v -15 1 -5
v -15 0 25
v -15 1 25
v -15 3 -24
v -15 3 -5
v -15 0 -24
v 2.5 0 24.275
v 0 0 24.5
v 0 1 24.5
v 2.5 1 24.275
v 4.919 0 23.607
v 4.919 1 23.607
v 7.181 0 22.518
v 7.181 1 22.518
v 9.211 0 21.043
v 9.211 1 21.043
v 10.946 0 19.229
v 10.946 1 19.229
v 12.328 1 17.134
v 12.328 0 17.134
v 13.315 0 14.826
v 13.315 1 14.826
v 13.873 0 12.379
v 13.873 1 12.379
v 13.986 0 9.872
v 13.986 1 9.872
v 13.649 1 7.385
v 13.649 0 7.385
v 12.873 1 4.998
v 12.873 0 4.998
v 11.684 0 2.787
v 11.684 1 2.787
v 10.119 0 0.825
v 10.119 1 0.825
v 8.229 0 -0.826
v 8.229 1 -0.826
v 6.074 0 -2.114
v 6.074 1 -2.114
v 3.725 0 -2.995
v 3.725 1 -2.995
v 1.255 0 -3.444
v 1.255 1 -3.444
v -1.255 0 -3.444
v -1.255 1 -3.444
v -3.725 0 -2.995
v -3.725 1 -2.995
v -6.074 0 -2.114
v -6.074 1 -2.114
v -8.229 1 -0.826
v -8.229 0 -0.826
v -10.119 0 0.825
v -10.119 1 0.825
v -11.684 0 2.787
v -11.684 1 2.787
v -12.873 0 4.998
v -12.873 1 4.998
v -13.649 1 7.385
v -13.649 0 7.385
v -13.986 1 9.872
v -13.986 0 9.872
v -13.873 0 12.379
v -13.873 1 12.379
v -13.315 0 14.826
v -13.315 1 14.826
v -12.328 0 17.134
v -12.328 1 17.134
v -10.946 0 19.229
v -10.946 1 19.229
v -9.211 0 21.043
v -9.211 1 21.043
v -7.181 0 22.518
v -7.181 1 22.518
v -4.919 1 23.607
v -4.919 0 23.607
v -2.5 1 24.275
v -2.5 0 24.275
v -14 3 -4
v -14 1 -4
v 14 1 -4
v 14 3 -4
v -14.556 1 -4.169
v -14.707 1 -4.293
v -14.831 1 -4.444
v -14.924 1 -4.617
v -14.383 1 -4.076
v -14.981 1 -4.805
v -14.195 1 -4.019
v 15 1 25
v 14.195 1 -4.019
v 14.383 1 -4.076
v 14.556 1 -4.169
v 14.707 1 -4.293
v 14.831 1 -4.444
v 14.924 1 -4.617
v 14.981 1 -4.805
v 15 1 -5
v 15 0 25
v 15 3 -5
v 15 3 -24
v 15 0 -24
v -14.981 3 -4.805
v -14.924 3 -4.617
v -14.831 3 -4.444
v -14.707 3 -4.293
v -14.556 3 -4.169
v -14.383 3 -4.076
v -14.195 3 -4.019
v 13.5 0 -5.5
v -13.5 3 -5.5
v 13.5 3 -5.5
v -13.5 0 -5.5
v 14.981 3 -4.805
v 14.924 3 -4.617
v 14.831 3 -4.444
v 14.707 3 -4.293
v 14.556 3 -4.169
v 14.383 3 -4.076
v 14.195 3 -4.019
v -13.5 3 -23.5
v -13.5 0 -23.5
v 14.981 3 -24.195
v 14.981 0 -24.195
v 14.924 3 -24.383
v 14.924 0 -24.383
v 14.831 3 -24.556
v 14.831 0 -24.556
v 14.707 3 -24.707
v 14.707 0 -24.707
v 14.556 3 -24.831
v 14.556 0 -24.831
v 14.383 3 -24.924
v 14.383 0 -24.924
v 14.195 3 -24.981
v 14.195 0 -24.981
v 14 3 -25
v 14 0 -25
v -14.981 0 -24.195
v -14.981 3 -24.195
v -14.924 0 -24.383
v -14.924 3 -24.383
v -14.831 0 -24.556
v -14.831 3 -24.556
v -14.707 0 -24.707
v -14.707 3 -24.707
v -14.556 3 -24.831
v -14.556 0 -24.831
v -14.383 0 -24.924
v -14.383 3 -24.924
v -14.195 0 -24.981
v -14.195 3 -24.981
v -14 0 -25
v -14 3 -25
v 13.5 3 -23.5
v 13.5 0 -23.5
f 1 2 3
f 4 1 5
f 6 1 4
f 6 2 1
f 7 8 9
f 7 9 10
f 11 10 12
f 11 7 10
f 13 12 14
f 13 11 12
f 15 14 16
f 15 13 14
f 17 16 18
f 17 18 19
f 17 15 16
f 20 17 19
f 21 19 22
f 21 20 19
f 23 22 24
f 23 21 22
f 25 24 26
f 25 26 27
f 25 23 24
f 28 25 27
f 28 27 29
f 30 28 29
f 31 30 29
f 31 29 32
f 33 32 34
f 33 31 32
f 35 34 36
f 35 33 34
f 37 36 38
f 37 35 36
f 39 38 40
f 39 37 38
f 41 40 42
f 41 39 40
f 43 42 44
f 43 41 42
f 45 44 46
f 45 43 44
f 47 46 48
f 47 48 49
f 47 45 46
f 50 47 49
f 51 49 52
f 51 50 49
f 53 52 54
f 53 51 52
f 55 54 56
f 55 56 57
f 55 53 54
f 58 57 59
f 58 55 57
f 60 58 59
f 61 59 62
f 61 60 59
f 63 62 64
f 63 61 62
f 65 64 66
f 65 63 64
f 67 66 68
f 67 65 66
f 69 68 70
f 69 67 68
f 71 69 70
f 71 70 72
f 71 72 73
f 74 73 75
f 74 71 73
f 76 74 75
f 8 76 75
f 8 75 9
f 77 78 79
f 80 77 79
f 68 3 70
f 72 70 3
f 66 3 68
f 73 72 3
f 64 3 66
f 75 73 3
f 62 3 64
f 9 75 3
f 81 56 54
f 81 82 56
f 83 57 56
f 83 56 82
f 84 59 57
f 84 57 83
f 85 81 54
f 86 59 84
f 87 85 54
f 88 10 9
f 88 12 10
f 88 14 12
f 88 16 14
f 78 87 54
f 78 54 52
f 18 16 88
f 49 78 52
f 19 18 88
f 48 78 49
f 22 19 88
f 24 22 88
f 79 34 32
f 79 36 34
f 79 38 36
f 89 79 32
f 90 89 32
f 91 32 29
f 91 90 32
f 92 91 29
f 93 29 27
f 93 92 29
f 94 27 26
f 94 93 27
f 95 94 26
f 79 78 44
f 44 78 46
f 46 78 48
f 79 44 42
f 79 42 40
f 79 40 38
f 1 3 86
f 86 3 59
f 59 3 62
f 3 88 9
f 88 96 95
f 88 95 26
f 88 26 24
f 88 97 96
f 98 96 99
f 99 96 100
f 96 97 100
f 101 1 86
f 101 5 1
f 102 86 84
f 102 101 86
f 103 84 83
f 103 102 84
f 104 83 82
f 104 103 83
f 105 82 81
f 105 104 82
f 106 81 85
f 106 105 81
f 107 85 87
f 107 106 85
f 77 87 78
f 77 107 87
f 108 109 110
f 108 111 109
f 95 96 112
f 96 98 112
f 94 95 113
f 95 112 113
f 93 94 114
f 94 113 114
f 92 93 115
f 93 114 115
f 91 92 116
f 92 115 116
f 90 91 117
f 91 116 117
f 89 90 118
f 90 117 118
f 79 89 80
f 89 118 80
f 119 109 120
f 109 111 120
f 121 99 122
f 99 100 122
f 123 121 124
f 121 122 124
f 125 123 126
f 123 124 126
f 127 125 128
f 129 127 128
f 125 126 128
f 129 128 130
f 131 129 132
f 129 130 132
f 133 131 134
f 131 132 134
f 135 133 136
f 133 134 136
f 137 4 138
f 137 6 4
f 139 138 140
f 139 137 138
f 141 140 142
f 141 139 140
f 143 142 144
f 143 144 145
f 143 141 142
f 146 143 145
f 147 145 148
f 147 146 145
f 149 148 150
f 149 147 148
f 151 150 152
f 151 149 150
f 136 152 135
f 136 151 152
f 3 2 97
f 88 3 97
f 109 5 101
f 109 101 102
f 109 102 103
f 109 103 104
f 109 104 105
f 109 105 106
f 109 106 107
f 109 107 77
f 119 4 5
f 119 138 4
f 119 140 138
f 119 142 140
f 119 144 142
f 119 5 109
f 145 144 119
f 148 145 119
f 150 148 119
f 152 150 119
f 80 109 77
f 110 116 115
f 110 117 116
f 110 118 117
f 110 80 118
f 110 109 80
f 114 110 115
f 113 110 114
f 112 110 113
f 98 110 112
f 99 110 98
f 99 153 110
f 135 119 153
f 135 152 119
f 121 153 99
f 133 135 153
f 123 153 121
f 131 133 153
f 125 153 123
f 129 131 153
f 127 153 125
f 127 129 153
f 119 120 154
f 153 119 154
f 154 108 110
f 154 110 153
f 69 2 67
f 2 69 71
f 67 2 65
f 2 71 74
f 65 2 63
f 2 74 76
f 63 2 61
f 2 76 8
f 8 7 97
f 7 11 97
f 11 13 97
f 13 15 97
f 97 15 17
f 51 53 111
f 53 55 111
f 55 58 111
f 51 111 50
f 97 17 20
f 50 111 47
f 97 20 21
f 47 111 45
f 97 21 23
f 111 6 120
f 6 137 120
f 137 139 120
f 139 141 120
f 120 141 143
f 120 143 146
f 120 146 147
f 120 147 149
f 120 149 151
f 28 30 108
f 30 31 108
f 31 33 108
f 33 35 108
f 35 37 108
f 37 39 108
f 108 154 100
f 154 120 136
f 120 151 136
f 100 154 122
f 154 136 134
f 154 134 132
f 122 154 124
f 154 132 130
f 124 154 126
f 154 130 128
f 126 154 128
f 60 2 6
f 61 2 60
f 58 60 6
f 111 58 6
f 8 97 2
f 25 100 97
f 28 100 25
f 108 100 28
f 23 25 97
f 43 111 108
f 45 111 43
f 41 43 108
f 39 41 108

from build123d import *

# Parameters (mm, degrees)
ESQUISSE1_W        = 30
ESQUISSE1_H        = 50
ESQUISSE1_R        = 14
ESQUISSE1_W_2      = 27
ESQUISSE1_H_2      = 18
BOSS_EXTRU_1_DEPTH = 1
ESQUISSE2_W        = 30
ESQUISSE2_H        = 21
ESQUISSE2_W_2      = 27
ESQUISSE2_H_2      = 18
BOSS_EXTRU_2_DEPTH = 2
CONG_1_R           = 1


with BuildPart() as part:
    # Esquisse1 → Boss.-Extru.1 (new body)
    with BuildSketch(Plane(origin=(0, 0, 0), x_dir=(1, 0, 0), z_dir=(0, 1, 0))):
        Rectangle(ESQUISSE1_W, ESQUISSE1_H)
        with Locations(Location((0, -10.5, 0), (0, 0, 270))):
            Circle(ESQUISSE1_R, mode=Mode.SUBTRACT)
        with Locations((0, 14.5)):
            Rectangle(ESQUISSE1_W_2, ESQUISSE1_H_2, mode=Mode.SUBTRACT)
    extrude(amount=BOSS_EXTRU_1_DEPTH)

    # Esquisse2 → Boss.-Extru.2 (add)
    with BuildSketch(Plane(origin=(0, 1, 0), x_dir=(1, 0, 0), z_dir=(0, 1, 0))):
        with Locations((0, 14.5)):
            Rectangle(ESQUISSE2_W, ESQUISSE2_H)
        with Locations((0, 14.5)):
            Rectangle(ESQUISSE2_W_2, ESQUISSE2_H_2, mode=Mode.SUBTRACT)
    extrude(amount=BOSS_EXTRU_2_DEPTH)

    # Congé1
    cong_1_edges = [part.edges().sort_by_distance(p)[0] for p in [
        (-15, 1.5, -25),
        (-15, 2, -4),
        (15, 1.5, -25),
        (15, 2, -4),
    ]]
    fillet(cong_1_edges, radius=CONG_1_R)


solid = part.part
